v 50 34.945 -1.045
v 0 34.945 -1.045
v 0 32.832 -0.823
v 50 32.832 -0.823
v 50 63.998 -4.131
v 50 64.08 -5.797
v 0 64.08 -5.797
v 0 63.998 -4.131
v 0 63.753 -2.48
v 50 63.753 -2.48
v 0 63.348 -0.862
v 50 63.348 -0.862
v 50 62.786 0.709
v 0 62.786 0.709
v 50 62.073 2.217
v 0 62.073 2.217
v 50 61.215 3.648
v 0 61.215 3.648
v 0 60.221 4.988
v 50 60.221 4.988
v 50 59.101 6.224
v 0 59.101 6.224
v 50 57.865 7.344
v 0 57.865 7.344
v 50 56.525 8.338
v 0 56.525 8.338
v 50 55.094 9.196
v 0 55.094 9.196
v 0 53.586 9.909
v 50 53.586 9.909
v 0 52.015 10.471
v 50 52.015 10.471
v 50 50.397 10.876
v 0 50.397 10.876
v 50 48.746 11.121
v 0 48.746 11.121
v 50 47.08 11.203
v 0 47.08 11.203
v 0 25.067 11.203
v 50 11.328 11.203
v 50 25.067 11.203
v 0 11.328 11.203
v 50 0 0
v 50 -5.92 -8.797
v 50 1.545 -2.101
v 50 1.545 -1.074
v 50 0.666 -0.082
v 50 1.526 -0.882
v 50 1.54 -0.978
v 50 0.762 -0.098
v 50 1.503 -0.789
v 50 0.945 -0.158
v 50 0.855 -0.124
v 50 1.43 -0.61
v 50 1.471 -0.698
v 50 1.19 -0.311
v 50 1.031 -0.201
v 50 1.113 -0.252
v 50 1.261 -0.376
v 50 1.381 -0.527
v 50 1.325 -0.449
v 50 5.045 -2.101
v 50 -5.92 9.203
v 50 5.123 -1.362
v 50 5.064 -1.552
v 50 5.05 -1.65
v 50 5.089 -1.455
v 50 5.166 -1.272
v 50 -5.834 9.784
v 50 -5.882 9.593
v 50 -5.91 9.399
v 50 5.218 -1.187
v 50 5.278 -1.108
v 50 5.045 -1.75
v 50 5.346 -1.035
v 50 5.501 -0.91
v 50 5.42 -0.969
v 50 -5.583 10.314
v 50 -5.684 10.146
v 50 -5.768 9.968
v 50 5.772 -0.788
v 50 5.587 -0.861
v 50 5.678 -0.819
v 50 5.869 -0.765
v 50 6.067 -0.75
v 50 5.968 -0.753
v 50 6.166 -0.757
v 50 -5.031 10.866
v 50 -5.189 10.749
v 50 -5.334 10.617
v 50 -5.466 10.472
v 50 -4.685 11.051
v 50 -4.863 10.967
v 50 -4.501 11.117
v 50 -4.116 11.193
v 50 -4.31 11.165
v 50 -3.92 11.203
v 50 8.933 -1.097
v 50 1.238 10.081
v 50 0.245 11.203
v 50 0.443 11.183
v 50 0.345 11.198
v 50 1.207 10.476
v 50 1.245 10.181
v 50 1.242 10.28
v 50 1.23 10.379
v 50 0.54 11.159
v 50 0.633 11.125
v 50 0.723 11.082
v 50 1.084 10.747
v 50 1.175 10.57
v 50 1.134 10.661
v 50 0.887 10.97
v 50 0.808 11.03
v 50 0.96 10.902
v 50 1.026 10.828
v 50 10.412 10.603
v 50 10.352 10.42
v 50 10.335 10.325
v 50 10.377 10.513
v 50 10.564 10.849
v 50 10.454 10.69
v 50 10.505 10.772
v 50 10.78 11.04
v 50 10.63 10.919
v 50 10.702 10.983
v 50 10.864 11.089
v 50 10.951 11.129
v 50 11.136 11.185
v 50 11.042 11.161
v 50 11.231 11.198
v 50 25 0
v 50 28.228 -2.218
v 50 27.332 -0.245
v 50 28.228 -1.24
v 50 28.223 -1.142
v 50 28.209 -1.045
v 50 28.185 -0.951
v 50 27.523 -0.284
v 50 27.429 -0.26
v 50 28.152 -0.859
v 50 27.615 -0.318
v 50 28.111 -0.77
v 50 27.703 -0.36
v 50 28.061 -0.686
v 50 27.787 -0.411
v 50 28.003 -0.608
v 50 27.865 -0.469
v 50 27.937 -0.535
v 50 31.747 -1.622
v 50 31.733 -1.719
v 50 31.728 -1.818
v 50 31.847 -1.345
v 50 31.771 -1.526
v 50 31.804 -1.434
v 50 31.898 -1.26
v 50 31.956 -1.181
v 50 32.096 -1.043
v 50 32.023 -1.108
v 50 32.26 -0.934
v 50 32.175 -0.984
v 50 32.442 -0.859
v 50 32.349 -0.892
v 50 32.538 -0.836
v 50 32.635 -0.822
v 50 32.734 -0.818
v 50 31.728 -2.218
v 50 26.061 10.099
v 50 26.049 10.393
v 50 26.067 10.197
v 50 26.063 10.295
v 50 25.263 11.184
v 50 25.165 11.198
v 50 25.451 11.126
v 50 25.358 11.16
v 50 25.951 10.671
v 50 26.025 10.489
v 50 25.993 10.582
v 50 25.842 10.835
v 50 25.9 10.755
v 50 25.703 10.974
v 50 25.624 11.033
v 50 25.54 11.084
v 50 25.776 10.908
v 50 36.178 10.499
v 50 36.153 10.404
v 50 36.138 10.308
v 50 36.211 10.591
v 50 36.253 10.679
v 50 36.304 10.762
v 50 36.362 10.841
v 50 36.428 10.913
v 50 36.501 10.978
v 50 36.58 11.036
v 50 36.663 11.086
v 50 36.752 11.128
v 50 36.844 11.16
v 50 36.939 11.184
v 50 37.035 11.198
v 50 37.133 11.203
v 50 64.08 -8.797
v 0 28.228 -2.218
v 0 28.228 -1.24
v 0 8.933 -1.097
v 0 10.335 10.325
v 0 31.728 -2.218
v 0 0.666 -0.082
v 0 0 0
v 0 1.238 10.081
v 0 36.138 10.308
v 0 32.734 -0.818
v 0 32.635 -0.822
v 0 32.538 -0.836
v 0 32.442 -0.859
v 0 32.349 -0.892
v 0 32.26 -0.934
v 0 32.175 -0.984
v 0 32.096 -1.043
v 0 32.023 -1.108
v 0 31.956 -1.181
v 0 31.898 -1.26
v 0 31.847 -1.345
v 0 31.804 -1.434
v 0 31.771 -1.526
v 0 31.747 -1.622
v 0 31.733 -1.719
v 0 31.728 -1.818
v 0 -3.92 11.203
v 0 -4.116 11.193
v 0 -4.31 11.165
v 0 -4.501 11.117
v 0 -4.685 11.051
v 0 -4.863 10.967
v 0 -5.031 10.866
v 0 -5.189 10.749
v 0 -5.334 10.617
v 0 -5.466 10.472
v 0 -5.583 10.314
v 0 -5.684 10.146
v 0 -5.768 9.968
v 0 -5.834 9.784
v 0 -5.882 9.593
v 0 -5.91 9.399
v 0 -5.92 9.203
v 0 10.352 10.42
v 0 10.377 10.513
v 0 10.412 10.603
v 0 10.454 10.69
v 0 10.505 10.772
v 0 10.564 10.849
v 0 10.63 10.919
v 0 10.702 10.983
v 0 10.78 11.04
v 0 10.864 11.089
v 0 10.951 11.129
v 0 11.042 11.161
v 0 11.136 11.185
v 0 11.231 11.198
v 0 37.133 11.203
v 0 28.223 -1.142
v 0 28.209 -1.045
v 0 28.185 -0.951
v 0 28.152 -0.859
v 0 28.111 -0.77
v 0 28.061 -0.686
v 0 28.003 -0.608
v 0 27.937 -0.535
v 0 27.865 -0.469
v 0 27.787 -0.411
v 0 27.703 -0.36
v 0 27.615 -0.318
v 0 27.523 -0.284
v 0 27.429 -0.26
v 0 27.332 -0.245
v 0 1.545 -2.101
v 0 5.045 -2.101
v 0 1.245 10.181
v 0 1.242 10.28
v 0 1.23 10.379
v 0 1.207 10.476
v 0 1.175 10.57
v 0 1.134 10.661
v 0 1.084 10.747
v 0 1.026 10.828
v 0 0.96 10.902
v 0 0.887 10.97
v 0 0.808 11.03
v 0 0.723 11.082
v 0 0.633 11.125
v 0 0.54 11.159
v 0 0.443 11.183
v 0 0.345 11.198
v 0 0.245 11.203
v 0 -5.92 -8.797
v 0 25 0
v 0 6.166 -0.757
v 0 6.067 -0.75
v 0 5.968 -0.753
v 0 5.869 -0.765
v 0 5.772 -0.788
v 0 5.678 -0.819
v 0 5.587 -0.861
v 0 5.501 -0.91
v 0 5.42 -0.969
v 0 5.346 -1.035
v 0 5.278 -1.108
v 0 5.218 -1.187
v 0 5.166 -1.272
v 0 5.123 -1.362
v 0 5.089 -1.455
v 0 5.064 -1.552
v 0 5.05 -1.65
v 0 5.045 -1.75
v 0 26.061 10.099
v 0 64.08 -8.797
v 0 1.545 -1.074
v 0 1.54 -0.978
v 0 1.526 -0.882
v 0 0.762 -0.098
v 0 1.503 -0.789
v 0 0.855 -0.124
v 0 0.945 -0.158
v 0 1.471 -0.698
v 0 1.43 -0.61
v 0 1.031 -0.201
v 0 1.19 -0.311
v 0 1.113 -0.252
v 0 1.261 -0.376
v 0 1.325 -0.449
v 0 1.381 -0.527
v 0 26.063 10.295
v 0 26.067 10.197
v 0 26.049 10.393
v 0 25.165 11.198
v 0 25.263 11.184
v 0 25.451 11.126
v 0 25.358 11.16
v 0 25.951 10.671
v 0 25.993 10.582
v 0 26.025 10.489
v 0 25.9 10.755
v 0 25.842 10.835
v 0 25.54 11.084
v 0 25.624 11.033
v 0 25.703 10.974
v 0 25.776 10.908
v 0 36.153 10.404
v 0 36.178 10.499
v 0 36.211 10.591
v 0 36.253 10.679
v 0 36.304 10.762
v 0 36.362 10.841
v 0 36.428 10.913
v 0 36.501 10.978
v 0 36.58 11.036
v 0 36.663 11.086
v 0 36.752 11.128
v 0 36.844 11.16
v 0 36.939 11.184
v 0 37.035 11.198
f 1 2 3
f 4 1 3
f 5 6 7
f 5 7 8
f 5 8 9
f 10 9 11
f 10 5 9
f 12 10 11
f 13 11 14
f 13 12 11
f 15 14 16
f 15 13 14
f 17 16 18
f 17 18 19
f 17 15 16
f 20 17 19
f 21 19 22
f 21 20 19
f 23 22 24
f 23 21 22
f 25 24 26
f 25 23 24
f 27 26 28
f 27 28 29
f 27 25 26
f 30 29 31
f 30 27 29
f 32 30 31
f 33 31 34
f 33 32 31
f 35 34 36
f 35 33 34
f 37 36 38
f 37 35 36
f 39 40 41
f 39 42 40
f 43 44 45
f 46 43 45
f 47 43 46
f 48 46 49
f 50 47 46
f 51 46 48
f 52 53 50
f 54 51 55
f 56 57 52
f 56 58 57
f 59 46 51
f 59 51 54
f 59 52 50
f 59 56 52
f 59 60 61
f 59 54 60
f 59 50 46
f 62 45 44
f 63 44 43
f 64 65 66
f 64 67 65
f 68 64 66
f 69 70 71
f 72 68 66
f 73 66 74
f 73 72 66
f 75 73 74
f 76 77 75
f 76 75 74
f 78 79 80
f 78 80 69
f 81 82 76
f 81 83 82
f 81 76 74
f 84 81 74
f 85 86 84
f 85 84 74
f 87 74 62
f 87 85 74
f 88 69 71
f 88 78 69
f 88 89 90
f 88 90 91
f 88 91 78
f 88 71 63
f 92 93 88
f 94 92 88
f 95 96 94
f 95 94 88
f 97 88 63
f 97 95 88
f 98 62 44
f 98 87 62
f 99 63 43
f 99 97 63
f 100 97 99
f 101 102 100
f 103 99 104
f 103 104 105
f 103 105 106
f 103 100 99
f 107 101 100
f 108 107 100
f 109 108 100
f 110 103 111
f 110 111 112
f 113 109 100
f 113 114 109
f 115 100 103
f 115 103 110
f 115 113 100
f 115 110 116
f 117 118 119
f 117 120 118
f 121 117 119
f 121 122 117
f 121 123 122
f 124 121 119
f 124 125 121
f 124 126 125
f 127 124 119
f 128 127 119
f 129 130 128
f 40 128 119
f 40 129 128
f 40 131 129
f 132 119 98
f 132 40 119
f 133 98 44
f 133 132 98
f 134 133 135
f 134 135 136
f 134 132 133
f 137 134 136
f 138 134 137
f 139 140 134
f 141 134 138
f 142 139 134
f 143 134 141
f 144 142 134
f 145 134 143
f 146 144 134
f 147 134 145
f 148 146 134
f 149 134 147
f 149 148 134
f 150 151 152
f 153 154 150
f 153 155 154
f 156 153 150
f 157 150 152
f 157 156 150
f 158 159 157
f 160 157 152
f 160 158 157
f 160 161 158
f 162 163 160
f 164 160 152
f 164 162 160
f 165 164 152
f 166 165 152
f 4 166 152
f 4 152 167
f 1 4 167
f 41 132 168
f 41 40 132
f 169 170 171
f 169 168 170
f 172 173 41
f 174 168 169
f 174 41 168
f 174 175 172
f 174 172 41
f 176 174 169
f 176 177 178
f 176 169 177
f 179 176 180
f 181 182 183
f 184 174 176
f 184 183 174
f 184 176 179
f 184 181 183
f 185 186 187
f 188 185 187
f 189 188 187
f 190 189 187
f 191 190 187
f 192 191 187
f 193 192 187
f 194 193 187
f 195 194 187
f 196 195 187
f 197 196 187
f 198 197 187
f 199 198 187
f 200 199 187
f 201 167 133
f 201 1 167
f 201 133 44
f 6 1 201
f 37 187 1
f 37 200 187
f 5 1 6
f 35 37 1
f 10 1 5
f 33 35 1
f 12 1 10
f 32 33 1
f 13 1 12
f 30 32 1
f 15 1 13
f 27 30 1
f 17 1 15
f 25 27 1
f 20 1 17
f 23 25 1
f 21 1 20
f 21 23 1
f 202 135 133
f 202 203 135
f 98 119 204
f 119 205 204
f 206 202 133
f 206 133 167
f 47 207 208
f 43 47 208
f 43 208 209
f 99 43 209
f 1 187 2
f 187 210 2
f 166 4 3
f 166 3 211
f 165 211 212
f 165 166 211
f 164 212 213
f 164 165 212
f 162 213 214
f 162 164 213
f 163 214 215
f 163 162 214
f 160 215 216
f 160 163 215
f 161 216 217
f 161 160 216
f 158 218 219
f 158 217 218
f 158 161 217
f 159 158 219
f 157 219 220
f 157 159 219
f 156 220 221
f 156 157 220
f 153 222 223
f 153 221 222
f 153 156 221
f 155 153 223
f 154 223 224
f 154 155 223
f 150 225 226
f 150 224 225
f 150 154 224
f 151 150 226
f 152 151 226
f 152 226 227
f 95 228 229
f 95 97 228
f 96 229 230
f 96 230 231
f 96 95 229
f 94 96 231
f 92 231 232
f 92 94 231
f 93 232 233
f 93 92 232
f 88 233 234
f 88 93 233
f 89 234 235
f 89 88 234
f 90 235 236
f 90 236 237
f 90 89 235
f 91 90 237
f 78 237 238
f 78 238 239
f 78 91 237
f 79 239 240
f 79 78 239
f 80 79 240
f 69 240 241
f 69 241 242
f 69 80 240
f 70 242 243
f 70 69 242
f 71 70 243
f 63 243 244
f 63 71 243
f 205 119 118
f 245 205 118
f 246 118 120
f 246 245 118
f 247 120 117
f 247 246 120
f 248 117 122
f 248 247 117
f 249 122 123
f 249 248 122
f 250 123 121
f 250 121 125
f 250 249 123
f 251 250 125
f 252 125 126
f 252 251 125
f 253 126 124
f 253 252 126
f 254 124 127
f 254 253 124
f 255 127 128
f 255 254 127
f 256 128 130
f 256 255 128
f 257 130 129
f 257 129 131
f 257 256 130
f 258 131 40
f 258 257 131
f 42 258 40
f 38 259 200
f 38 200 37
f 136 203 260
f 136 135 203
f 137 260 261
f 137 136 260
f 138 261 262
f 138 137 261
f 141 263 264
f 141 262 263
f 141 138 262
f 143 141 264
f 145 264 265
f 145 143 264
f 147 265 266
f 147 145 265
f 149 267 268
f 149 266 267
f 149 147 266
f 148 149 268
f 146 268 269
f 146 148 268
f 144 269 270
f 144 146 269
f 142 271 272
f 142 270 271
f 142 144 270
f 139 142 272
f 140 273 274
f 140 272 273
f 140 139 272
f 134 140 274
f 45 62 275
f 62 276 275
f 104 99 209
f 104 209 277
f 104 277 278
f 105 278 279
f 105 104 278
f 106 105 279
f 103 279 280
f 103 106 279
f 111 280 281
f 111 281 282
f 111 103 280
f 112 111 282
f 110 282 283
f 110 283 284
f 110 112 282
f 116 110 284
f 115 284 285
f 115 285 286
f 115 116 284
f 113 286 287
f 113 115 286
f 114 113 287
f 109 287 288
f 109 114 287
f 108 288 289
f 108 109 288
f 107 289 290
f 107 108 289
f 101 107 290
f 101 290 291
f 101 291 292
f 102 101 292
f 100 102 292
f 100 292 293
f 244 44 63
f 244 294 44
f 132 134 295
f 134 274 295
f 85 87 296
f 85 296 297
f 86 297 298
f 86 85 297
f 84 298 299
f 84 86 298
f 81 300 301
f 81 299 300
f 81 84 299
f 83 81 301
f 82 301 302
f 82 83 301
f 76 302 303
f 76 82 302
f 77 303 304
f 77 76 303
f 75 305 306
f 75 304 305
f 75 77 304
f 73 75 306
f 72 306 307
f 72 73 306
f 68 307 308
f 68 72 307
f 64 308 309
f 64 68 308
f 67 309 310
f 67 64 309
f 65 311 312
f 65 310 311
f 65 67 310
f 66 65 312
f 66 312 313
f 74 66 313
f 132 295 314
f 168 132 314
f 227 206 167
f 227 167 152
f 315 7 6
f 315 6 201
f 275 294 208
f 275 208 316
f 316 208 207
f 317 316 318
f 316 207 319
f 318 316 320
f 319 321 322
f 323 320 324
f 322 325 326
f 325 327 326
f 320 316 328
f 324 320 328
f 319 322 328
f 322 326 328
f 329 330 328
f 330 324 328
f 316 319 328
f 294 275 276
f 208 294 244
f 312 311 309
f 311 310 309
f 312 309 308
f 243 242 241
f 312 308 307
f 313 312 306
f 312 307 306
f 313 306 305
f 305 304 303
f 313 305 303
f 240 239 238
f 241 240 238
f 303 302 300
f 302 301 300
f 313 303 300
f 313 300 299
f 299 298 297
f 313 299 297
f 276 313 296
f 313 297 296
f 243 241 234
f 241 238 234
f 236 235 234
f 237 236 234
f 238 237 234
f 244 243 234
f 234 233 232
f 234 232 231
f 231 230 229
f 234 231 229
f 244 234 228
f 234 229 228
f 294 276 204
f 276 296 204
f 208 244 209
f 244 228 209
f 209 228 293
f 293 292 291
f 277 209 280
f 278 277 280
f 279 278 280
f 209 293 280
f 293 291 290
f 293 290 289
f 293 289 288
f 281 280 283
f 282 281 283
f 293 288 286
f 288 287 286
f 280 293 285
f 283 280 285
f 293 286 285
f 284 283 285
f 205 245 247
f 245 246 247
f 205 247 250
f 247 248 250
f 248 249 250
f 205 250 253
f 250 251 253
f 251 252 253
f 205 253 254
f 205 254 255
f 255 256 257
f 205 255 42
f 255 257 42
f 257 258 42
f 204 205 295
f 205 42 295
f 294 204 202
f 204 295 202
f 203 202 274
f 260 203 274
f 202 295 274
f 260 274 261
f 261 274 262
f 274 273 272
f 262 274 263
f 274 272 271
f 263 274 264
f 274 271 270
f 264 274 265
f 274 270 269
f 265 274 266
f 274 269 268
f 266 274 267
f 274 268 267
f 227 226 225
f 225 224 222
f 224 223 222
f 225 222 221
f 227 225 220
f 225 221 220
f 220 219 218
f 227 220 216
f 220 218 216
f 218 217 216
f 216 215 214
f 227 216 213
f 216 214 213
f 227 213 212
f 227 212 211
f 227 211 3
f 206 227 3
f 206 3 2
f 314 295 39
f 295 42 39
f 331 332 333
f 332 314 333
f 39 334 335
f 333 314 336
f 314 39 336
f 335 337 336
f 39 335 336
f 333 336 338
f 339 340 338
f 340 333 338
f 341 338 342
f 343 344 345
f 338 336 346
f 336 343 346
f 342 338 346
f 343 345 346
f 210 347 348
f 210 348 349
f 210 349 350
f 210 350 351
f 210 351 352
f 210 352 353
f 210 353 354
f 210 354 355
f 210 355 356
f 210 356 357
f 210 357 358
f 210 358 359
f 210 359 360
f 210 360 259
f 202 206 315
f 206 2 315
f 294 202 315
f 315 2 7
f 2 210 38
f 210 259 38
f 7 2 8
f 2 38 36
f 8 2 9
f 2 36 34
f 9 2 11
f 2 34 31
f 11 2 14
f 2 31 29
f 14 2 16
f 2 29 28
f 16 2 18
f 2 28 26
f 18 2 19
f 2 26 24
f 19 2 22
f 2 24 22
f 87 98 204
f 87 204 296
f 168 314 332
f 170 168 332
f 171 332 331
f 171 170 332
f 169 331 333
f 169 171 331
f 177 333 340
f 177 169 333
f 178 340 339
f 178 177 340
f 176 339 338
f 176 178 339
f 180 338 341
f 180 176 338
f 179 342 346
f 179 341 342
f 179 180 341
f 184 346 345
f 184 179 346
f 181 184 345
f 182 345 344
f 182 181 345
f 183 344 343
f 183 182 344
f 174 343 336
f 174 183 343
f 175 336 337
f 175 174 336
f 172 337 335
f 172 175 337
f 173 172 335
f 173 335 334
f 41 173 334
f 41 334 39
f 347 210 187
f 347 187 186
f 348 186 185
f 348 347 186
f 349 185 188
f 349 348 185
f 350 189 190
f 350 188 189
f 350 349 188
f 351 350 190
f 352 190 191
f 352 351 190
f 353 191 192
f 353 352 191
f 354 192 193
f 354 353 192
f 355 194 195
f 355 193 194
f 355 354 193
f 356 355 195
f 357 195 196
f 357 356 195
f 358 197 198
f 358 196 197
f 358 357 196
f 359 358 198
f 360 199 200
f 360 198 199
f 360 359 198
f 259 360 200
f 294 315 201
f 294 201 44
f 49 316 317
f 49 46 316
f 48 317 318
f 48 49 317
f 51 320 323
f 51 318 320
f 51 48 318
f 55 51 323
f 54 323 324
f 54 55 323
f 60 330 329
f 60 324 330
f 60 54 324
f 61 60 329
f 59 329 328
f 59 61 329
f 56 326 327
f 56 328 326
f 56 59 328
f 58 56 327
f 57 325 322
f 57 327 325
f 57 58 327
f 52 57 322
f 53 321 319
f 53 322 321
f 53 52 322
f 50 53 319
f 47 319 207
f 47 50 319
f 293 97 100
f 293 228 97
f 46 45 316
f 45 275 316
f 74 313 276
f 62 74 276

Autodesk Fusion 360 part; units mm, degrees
sketch "Sketch1" plane through (0, 0, 0) normal (1, 0, 0) x (0, 1, 0)
  line L0 (0, 0) -> (9.7495, 79.4037)
  line L1 (9.7495, 79.4037) -> (18.6825, 78.3069)
  line L2 (18.6825, 78.3069) -> (8.9329, -1.0968)
  line L3 (8.9329, -1.0968) -> (0, 0)
  line L4 (1.5446, -0.1007) -> (5.0446, -0.1007)
  line L5 (5.0446, -0.1007) -> (5.0446, -2.1007)
  line L6 (5.0446, -2.1007) -> (1.5446, -2.1007)
  line L7 (1.5446, -2.1007) -> (1.5446, -0.1007)
  line L8 (0, 140) -> (0, -50)
  line L9 (25, 0) -> (33.3623, 79.5618)
  line L10 (33.3623, 79.5618) -> (43.3075, 78.5165)
  line L11 (43.3075, 78.5165) -> (34.9452, -1.0453)
  line L12 (34.9452, -1.0453) -> (25, 0)
  line L13 (-90, 0) -> (150, 0)
  line L14 (28.2277, -2.2181) -> (31.7277, -2.2181)
  line L15 (31.7277, -2.2181) -> (31.7277, -0.2181)
  line L16 (31.7277, -0.2181) -> (28.2277, -0.2181)
  line L17 (28.2277, -0.2181) -> (28.2277, -2.2181)
  dimension "d1" = 80
  dimension "d2" = 9
  dimension "d9" = 3.5
  dimension "d10" = 2
  dimension "d12" = 80
  dimension "d13" = 10
  dimension "d15" = 97
  dimension "d16" = 96
  dimension "d17" = 25
  dimension "d18" = 3.5
  dimension "d19" = 2
sketch "Sketch2" plane through (0, 0, 0) normal (1, 0, 0) x (0, 1, 0)
  line L0 (-5.92, 11.2031) -> (64.08, 11.2031)
  line L1 (64.08, 11.2031) -> (64.08, -8.7969)
  line L2 (64.08, -8.7969) -> (-5.92, -8.7969)
  line L3 (-5.92, -8.7969) -> (-5.92, 11.2031)
  dimension "d3" = 70
  dimension "d4" = 20
extrude "Extrude1" add sketch "Sketch2" along normal blind 50
extrude "Extrude2" cut sketch "Sketch1" along normal blind 50
fillet "Fillet1" radius 1 4 edges at (25, 5.0446, -0.6194) (25, 1.5446, -0.1897) (25, 31.7277, -0.7071) (25, 28.2277, -0.3392)
fillet "Fillet2" radius 1 4 edges at (25, 10.4432, 11.2031) (25, 36.2326, 11.2031) (25, 26.1775, 11.2031) (25, 1.3756, 11.2031)
fillet "Fillet3" radius 2 1 edges at (25, -5.92, 11.2031)
fillet "Fillet4" radius 17 1 edges at (25, 64.08, 11.2031)
